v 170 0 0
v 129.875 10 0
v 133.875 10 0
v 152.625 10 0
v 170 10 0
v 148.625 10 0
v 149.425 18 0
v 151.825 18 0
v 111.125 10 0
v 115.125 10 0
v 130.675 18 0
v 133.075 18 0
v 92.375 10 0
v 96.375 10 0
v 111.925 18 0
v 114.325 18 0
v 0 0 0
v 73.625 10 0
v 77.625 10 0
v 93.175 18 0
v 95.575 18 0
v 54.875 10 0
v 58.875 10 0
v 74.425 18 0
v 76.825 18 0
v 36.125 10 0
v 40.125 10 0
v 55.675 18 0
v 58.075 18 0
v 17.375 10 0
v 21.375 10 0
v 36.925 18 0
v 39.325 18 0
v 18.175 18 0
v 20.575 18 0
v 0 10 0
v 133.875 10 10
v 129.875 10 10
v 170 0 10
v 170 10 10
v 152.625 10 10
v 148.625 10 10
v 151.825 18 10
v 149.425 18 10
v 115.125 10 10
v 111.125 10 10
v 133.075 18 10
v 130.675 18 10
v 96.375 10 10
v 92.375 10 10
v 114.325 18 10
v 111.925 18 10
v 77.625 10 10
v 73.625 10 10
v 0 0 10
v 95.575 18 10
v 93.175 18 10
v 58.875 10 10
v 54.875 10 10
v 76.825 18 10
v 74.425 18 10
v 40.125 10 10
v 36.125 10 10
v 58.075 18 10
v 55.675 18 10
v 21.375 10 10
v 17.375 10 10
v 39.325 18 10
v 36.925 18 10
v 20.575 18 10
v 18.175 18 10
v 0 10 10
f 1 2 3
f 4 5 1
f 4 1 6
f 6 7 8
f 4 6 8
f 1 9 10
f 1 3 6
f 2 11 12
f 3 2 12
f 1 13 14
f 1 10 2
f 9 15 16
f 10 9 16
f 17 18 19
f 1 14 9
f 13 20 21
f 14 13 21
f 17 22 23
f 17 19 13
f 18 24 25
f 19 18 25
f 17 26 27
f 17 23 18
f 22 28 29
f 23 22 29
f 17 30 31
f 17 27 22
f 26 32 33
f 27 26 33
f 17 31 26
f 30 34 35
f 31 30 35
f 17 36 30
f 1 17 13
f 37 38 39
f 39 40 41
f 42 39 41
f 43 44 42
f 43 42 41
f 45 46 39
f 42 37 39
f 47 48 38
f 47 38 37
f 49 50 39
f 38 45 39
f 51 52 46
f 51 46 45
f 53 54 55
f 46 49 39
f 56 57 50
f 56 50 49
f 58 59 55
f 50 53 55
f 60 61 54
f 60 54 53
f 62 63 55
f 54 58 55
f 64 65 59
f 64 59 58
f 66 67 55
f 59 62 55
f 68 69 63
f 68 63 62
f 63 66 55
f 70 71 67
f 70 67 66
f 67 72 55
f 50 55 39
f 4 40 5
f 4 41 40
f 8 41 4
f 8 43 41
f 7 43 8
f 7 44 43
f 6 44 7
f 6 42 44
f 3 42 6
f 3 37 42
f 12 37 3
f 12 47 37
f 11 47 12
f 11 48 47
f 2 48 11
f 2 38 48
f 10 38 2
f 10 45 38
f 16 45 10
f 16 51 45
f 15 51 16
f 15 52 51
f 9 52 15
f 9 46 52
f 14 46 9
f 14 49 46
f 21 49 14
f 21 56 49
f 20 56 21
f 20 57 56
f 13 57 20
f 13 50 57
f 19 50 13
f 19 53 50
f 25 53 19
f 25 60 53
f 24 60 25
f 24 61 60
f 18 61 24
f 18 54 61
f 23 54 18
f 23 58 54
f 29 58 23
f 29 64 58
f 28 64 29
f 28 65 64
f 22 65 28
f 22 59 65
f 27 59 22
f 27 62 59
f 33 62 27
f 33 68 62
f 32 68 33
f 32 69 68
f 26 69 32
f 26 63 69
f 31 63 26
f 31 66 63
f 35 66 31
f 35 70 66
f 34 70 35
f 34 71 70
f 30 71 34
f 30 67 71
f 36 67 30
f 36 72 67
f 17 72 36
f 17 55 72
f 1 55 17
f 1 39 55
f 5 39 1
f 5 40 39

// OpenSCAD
$fn = 32;

// ----------------------------------------------------------------------
// Gear rack: 8 teeth on a 170 mm bar, pitch 18.75 mm
// ----------------------------------------------------------------------

// --- parameters (mm) ---
profile_height = 10;      // extrusion height
profile_points = 36;      // points of the closed outline

profile = [[0, 0], [170, 0], [170, 10], [152.625, 10], [151.825, 18], [149.425, 18], [148.625, 10], [133.875, 10], [133.075, 18], [130.675, 18], [129.875, 10], [115.125, 10], [114.325, 18], [111.925, 18], [111.125, 10], [96.375, 10], [95.575, 18], [93.175, 18], [92.375, 10], [77.625, 10], [76.825, 18], [74.425, 18], [73.625, 10], [58.875, 10], [58.075, 18], [55.675, 18], [54.875, 10], [40.125, 10], [39.325, 18], [36.925, 18], [36.125, 10], [21.375, 10], [20.575, 18], [18.175, 18], [17.375, 10], [0, 10]];  // single closed polygon, 36 points, counter clockwise

// --- the one profile operation ---
linear_extrude(height = profile_height) polygon(points = profile);
